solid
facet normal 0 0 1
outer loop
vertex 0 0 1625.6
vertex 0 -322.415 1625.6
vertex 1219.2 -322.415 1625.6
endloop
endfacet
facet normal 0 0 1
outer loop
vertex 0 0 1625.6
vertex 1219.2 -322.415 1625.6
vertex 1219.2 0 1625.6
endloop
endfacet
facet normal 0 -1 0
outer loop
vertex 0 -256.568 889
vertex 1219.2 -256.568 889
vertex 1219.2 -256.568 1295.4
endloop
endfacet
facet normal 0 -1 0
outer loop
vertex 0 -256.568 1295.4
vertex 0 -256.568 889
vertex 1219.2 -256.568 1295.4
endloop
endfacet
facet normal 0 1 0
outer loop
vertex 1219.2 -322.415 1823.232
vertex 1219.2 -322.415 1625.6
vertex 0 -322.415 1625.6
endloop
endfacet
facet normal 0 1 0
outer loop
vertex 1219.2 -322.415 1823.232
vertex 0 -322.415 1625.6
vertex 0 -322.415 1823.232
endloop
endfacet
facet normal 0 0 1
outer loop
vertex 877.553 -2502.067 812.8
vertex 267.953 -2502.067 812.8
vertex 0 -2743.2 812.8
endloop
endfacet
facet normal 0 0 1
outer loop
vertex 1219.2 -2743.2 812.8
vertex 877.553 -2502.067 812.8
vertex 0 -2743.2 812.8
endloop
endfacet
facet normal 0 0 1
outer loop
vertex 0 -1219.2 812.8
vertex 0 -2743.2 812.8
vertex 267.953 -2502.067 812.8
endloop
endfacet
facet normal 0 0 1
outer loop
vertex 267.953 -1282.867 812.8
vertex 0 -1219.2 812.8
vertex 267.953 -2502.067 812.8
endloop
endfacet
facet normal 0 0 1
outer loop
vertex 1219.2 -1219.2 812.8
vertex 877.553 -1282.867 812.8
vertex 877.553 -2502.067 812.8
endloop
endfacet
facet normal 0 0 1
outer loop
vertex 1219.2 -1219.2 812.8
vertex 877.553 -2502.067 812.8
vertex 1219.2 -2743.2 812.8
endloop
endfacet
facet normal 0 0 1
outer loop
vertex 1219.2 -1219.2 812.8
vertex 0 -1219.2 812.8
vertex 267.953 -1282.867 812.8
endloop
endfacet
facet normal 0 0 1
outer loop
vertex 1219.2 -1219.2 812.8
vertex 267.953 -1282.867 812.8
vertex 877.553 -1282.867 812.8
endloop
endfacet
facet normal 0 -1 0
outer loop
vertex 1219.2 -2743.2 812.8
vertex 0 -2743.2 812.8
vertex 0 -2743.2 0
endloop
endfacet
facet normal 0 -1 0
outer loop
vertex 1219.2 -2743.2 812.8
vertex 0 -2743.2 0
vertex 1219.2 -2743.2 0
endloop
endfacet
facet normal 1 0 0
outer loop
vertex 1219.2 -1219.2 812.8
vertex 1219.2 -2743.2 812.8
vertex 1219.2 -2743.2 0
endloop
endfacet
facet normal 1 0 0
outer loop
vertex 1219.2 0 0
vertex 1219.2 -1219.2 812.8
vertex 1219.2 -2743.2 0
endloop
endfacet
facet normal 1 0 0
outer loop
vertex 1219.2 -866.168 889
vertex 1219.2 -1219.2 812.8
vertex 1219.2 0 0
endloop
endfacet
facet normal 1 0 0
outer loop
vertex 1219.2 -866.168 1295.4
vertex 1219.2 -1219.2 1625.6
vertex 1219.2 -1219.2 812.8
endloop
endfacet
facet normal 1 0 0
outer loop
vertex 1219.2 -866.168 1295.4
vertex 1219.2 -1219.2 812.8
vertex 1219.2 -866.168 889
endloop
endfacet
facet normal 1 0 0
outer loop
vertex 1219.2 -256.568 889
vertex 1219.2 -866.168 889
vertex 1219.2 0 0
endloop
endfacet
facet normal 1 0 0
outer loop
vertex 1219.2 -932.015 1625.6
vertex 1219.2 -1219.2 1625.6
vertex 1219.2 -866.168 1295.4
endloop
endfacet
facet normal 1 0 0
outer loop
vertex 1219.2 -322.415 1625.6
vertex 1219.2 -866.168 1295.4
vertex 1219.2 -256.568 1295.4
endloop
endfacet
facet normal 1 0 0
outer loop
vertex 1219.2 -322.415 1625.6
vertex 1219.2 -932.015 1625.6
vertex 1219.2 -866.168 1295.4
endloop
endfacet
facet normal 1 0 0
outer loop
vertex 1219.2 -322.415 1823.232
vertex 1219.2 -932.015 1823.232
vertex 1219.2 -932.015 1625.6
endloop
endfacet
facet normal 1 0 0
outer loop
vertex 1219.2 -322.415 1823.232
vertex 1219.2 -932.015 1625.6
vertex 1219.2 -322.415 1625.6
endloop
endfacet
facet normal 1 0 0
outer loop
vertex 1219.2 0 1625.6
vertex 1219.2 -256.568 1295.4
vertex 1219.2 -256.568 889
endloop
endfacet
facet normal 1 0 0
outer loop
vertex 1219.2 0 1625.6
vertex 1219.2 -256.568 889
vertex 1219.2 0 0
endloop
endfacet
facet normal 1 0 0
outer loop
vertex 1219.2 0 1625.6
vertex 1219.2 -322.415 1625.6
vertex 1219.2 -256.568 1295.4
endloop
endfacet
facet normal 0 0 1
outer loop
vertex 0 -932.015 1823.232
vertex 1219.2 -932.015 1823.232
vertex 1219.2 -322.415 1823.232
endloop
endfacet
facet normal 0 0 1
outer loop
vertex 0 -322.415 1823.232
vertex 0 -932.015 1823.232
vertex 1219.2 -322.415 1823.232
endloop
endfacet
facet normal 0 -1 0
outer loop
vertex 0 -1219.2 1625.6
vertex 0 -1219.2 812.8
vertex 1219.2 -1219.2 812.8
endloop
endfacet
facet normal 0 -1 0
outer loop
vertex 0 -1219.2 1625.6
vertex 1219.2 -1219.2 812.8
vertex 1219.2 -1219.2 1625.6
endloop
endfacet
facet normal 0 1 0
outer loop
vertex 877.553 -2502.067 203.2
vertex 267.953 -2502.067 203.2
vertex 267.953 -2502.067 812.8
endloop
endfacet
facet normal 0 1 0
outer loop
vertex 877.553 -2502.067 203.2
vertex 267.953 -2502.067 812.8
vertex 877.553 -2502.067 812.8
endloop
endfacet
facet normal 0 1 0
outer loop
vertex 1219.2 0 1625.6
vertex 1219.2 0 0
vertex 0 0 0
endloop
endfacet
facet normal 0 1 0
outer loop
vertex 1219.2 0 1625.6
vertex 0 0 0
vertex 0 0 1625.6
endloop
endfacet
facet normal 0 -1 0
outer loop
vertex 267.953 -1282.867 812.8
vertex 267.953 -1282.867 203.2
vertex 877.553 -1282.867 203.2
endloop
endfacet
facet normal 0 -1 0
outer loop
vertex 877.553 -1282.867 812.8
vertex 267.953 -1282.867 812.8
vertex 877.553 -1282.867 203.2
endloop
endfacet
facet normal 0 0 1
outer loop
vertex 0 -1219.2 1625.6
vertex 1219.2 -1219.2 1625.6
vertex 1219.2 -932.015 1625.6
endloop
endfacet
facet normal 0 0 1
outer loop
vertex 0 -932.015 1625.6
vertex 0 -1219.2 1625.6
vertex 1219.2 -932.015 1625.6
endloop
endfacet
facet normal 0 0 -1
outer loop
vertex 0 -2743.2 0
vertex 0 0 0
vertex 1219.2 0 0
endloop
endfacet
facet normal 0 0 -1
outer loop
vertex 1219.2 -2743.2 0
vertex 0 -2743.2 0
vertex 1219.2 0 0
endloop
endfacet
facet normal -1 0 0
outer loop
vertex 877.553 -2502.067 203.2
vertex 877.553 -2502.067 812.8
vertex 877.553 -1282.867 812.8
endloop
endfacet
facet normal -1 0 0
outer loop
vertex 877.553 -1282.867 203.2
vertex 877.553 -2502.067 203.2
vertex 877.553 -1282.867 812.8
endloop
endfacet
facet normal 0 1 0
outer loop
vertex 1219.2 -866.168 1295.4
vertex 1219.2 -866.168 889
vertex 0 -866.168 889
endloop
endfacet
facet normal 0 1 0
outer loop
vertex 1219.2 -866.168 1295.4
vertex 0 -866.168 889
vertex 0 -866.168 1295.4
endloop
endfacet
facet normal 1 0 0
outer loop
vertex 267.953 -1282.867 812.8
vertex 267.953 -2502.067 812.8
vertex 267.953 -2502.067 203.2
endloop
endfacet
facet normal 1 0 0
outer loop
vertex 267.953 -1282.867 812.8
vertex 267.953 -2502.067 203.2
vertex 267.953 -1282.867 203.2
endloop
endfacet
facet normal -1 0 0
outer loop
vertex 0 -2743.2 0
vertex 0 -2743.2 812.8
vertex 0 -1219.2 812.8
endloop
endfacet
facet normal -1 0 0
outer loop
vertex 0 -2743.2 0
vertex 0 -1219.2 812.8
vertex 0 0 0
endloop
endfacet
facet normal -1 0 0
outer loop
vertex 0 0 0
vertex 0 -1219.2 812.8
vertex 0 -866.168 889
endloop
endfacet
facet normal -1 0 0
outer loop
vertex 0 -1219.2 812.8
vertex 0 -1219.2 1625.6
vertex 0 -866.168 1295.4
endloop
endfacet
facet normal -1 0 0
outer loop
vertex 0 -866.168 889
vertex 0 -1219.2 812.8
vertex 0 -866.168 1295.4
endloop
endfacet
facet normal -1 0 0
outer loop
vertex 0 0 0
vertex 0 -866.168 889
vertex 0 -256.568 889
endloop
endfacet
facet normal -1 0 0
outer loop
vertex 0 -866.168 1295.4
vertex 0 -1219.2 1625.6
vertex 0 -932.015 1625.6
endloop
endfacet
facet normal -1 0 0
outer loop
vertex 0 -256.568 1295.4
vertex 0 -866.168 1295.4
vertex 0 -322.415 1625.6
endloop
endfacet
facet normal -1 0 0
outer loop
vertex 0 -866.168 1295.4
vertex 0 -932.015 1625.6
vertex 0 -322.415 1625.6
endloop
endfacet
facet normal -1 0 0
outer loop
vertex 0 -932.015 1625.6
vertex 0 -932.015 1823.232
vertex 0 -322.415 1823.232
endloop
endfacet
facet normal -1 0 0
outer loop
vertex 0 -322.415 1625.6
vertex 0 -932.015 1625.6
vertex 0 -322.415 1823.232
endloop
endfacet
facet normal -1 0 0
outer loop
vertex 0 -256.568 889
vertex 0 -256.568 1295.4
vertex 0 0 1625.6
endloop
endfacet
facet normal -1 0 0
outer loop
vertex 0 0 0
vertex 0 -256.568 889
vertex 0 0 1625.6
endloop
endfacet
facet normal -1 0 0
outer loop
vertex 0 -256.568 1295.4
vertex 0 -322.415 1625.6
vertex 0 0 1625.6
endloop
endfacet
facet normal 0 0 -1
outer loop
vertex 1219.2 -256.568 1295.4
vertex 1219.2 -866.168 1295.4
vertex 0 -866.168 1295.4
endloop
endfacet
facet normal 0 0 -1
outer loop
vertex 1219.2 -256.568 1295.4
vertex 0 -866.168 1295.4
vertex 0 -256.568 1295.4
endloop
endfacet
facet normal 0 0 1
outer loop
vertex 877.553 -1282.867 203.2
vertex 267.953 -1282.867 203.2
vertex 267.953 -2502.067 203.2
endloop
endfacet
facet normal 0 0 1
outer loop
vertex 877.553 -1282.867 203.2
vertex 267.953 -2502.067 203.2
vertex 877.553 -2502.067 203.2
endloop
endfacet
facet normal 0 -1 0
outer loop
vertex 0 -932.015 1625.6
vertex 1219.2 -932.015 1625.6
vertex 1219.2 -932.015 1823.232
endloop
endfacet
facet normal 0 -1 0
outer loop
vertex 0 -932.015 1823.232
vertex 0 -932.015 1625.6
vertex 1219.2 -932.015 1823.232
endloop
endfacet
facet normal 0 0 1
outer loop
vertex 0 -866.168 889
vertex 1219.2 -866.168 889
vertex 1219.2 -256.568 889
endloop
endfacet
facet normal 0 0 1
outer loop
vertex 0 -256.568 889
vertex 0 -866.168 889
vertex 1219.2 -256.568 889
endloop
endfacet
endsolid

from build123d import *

# Parameters (mm, degrees)
F0_W      = 1219.2
F0_H      = 812.8
F1_DEPTH  = 2743.2
F2_W      = 1219.2
F2_H      = 812.8
F3_DEPTH  = 1219.2
F5_W      = 609.6
F5_H      = 197.6317144394
F6_DEPTH  = 1219.2
F7_W      = 609.6
F7_H      = 406.4
F8_DEPTH  = 1219.2
F9_W      = 609.6
F9_H      = 1219.2
F10_DEPTH = 609.6


with BuildPart() as f1:
    # F0 (on Front) → F1 (new body)
    with BuildSketch(Plane.XZ):
        with Locations((609.6, 406.4)):
            Rectangle(F0_W, F0_H)
    extrude(amount=F1_DEPTH)

    # F2 (on face) → F3 (join)
    with BuildSketch(Plane.YZ.offset(1219.2)):
        with Locations((-609.6, 1219.2)):
            Rectangle(F2_W, F2_H)
    extrude(amount=-F3_DEPTH)

    # F5 (on face) → F6 (join)
    with BuildSketch(Plane.YZ.offset(1219.2)):
        with Locations((-627.2147037506, 1724.4158572197)):
            Rectangle(F5_W, F5_H)
    extrude(amount=-F6_DEPTH)

    # F7 (on face) → F8 (cut)
    with BuildSketch(Plane.YZ.offset(1219.2)):
        with Locations((-561.3680146217, 1092.2)):
            Rectangle(F7_W, F7_H)
    extrude(amount=-F8_DEPTH, mode=Mode.SUBTRACT)

    # F9 (on face) → F10 (cut)
    with BuildSketch(Plane.XY.offset(812.8)):
        with Locations((572.7532841682, -1892.4670890808)):
            Rectangle(F9_W, F9_H)
    extrude(amount=-F10_DEPTH, mode=Mode.SUBTRACT)


solid = f1.part
